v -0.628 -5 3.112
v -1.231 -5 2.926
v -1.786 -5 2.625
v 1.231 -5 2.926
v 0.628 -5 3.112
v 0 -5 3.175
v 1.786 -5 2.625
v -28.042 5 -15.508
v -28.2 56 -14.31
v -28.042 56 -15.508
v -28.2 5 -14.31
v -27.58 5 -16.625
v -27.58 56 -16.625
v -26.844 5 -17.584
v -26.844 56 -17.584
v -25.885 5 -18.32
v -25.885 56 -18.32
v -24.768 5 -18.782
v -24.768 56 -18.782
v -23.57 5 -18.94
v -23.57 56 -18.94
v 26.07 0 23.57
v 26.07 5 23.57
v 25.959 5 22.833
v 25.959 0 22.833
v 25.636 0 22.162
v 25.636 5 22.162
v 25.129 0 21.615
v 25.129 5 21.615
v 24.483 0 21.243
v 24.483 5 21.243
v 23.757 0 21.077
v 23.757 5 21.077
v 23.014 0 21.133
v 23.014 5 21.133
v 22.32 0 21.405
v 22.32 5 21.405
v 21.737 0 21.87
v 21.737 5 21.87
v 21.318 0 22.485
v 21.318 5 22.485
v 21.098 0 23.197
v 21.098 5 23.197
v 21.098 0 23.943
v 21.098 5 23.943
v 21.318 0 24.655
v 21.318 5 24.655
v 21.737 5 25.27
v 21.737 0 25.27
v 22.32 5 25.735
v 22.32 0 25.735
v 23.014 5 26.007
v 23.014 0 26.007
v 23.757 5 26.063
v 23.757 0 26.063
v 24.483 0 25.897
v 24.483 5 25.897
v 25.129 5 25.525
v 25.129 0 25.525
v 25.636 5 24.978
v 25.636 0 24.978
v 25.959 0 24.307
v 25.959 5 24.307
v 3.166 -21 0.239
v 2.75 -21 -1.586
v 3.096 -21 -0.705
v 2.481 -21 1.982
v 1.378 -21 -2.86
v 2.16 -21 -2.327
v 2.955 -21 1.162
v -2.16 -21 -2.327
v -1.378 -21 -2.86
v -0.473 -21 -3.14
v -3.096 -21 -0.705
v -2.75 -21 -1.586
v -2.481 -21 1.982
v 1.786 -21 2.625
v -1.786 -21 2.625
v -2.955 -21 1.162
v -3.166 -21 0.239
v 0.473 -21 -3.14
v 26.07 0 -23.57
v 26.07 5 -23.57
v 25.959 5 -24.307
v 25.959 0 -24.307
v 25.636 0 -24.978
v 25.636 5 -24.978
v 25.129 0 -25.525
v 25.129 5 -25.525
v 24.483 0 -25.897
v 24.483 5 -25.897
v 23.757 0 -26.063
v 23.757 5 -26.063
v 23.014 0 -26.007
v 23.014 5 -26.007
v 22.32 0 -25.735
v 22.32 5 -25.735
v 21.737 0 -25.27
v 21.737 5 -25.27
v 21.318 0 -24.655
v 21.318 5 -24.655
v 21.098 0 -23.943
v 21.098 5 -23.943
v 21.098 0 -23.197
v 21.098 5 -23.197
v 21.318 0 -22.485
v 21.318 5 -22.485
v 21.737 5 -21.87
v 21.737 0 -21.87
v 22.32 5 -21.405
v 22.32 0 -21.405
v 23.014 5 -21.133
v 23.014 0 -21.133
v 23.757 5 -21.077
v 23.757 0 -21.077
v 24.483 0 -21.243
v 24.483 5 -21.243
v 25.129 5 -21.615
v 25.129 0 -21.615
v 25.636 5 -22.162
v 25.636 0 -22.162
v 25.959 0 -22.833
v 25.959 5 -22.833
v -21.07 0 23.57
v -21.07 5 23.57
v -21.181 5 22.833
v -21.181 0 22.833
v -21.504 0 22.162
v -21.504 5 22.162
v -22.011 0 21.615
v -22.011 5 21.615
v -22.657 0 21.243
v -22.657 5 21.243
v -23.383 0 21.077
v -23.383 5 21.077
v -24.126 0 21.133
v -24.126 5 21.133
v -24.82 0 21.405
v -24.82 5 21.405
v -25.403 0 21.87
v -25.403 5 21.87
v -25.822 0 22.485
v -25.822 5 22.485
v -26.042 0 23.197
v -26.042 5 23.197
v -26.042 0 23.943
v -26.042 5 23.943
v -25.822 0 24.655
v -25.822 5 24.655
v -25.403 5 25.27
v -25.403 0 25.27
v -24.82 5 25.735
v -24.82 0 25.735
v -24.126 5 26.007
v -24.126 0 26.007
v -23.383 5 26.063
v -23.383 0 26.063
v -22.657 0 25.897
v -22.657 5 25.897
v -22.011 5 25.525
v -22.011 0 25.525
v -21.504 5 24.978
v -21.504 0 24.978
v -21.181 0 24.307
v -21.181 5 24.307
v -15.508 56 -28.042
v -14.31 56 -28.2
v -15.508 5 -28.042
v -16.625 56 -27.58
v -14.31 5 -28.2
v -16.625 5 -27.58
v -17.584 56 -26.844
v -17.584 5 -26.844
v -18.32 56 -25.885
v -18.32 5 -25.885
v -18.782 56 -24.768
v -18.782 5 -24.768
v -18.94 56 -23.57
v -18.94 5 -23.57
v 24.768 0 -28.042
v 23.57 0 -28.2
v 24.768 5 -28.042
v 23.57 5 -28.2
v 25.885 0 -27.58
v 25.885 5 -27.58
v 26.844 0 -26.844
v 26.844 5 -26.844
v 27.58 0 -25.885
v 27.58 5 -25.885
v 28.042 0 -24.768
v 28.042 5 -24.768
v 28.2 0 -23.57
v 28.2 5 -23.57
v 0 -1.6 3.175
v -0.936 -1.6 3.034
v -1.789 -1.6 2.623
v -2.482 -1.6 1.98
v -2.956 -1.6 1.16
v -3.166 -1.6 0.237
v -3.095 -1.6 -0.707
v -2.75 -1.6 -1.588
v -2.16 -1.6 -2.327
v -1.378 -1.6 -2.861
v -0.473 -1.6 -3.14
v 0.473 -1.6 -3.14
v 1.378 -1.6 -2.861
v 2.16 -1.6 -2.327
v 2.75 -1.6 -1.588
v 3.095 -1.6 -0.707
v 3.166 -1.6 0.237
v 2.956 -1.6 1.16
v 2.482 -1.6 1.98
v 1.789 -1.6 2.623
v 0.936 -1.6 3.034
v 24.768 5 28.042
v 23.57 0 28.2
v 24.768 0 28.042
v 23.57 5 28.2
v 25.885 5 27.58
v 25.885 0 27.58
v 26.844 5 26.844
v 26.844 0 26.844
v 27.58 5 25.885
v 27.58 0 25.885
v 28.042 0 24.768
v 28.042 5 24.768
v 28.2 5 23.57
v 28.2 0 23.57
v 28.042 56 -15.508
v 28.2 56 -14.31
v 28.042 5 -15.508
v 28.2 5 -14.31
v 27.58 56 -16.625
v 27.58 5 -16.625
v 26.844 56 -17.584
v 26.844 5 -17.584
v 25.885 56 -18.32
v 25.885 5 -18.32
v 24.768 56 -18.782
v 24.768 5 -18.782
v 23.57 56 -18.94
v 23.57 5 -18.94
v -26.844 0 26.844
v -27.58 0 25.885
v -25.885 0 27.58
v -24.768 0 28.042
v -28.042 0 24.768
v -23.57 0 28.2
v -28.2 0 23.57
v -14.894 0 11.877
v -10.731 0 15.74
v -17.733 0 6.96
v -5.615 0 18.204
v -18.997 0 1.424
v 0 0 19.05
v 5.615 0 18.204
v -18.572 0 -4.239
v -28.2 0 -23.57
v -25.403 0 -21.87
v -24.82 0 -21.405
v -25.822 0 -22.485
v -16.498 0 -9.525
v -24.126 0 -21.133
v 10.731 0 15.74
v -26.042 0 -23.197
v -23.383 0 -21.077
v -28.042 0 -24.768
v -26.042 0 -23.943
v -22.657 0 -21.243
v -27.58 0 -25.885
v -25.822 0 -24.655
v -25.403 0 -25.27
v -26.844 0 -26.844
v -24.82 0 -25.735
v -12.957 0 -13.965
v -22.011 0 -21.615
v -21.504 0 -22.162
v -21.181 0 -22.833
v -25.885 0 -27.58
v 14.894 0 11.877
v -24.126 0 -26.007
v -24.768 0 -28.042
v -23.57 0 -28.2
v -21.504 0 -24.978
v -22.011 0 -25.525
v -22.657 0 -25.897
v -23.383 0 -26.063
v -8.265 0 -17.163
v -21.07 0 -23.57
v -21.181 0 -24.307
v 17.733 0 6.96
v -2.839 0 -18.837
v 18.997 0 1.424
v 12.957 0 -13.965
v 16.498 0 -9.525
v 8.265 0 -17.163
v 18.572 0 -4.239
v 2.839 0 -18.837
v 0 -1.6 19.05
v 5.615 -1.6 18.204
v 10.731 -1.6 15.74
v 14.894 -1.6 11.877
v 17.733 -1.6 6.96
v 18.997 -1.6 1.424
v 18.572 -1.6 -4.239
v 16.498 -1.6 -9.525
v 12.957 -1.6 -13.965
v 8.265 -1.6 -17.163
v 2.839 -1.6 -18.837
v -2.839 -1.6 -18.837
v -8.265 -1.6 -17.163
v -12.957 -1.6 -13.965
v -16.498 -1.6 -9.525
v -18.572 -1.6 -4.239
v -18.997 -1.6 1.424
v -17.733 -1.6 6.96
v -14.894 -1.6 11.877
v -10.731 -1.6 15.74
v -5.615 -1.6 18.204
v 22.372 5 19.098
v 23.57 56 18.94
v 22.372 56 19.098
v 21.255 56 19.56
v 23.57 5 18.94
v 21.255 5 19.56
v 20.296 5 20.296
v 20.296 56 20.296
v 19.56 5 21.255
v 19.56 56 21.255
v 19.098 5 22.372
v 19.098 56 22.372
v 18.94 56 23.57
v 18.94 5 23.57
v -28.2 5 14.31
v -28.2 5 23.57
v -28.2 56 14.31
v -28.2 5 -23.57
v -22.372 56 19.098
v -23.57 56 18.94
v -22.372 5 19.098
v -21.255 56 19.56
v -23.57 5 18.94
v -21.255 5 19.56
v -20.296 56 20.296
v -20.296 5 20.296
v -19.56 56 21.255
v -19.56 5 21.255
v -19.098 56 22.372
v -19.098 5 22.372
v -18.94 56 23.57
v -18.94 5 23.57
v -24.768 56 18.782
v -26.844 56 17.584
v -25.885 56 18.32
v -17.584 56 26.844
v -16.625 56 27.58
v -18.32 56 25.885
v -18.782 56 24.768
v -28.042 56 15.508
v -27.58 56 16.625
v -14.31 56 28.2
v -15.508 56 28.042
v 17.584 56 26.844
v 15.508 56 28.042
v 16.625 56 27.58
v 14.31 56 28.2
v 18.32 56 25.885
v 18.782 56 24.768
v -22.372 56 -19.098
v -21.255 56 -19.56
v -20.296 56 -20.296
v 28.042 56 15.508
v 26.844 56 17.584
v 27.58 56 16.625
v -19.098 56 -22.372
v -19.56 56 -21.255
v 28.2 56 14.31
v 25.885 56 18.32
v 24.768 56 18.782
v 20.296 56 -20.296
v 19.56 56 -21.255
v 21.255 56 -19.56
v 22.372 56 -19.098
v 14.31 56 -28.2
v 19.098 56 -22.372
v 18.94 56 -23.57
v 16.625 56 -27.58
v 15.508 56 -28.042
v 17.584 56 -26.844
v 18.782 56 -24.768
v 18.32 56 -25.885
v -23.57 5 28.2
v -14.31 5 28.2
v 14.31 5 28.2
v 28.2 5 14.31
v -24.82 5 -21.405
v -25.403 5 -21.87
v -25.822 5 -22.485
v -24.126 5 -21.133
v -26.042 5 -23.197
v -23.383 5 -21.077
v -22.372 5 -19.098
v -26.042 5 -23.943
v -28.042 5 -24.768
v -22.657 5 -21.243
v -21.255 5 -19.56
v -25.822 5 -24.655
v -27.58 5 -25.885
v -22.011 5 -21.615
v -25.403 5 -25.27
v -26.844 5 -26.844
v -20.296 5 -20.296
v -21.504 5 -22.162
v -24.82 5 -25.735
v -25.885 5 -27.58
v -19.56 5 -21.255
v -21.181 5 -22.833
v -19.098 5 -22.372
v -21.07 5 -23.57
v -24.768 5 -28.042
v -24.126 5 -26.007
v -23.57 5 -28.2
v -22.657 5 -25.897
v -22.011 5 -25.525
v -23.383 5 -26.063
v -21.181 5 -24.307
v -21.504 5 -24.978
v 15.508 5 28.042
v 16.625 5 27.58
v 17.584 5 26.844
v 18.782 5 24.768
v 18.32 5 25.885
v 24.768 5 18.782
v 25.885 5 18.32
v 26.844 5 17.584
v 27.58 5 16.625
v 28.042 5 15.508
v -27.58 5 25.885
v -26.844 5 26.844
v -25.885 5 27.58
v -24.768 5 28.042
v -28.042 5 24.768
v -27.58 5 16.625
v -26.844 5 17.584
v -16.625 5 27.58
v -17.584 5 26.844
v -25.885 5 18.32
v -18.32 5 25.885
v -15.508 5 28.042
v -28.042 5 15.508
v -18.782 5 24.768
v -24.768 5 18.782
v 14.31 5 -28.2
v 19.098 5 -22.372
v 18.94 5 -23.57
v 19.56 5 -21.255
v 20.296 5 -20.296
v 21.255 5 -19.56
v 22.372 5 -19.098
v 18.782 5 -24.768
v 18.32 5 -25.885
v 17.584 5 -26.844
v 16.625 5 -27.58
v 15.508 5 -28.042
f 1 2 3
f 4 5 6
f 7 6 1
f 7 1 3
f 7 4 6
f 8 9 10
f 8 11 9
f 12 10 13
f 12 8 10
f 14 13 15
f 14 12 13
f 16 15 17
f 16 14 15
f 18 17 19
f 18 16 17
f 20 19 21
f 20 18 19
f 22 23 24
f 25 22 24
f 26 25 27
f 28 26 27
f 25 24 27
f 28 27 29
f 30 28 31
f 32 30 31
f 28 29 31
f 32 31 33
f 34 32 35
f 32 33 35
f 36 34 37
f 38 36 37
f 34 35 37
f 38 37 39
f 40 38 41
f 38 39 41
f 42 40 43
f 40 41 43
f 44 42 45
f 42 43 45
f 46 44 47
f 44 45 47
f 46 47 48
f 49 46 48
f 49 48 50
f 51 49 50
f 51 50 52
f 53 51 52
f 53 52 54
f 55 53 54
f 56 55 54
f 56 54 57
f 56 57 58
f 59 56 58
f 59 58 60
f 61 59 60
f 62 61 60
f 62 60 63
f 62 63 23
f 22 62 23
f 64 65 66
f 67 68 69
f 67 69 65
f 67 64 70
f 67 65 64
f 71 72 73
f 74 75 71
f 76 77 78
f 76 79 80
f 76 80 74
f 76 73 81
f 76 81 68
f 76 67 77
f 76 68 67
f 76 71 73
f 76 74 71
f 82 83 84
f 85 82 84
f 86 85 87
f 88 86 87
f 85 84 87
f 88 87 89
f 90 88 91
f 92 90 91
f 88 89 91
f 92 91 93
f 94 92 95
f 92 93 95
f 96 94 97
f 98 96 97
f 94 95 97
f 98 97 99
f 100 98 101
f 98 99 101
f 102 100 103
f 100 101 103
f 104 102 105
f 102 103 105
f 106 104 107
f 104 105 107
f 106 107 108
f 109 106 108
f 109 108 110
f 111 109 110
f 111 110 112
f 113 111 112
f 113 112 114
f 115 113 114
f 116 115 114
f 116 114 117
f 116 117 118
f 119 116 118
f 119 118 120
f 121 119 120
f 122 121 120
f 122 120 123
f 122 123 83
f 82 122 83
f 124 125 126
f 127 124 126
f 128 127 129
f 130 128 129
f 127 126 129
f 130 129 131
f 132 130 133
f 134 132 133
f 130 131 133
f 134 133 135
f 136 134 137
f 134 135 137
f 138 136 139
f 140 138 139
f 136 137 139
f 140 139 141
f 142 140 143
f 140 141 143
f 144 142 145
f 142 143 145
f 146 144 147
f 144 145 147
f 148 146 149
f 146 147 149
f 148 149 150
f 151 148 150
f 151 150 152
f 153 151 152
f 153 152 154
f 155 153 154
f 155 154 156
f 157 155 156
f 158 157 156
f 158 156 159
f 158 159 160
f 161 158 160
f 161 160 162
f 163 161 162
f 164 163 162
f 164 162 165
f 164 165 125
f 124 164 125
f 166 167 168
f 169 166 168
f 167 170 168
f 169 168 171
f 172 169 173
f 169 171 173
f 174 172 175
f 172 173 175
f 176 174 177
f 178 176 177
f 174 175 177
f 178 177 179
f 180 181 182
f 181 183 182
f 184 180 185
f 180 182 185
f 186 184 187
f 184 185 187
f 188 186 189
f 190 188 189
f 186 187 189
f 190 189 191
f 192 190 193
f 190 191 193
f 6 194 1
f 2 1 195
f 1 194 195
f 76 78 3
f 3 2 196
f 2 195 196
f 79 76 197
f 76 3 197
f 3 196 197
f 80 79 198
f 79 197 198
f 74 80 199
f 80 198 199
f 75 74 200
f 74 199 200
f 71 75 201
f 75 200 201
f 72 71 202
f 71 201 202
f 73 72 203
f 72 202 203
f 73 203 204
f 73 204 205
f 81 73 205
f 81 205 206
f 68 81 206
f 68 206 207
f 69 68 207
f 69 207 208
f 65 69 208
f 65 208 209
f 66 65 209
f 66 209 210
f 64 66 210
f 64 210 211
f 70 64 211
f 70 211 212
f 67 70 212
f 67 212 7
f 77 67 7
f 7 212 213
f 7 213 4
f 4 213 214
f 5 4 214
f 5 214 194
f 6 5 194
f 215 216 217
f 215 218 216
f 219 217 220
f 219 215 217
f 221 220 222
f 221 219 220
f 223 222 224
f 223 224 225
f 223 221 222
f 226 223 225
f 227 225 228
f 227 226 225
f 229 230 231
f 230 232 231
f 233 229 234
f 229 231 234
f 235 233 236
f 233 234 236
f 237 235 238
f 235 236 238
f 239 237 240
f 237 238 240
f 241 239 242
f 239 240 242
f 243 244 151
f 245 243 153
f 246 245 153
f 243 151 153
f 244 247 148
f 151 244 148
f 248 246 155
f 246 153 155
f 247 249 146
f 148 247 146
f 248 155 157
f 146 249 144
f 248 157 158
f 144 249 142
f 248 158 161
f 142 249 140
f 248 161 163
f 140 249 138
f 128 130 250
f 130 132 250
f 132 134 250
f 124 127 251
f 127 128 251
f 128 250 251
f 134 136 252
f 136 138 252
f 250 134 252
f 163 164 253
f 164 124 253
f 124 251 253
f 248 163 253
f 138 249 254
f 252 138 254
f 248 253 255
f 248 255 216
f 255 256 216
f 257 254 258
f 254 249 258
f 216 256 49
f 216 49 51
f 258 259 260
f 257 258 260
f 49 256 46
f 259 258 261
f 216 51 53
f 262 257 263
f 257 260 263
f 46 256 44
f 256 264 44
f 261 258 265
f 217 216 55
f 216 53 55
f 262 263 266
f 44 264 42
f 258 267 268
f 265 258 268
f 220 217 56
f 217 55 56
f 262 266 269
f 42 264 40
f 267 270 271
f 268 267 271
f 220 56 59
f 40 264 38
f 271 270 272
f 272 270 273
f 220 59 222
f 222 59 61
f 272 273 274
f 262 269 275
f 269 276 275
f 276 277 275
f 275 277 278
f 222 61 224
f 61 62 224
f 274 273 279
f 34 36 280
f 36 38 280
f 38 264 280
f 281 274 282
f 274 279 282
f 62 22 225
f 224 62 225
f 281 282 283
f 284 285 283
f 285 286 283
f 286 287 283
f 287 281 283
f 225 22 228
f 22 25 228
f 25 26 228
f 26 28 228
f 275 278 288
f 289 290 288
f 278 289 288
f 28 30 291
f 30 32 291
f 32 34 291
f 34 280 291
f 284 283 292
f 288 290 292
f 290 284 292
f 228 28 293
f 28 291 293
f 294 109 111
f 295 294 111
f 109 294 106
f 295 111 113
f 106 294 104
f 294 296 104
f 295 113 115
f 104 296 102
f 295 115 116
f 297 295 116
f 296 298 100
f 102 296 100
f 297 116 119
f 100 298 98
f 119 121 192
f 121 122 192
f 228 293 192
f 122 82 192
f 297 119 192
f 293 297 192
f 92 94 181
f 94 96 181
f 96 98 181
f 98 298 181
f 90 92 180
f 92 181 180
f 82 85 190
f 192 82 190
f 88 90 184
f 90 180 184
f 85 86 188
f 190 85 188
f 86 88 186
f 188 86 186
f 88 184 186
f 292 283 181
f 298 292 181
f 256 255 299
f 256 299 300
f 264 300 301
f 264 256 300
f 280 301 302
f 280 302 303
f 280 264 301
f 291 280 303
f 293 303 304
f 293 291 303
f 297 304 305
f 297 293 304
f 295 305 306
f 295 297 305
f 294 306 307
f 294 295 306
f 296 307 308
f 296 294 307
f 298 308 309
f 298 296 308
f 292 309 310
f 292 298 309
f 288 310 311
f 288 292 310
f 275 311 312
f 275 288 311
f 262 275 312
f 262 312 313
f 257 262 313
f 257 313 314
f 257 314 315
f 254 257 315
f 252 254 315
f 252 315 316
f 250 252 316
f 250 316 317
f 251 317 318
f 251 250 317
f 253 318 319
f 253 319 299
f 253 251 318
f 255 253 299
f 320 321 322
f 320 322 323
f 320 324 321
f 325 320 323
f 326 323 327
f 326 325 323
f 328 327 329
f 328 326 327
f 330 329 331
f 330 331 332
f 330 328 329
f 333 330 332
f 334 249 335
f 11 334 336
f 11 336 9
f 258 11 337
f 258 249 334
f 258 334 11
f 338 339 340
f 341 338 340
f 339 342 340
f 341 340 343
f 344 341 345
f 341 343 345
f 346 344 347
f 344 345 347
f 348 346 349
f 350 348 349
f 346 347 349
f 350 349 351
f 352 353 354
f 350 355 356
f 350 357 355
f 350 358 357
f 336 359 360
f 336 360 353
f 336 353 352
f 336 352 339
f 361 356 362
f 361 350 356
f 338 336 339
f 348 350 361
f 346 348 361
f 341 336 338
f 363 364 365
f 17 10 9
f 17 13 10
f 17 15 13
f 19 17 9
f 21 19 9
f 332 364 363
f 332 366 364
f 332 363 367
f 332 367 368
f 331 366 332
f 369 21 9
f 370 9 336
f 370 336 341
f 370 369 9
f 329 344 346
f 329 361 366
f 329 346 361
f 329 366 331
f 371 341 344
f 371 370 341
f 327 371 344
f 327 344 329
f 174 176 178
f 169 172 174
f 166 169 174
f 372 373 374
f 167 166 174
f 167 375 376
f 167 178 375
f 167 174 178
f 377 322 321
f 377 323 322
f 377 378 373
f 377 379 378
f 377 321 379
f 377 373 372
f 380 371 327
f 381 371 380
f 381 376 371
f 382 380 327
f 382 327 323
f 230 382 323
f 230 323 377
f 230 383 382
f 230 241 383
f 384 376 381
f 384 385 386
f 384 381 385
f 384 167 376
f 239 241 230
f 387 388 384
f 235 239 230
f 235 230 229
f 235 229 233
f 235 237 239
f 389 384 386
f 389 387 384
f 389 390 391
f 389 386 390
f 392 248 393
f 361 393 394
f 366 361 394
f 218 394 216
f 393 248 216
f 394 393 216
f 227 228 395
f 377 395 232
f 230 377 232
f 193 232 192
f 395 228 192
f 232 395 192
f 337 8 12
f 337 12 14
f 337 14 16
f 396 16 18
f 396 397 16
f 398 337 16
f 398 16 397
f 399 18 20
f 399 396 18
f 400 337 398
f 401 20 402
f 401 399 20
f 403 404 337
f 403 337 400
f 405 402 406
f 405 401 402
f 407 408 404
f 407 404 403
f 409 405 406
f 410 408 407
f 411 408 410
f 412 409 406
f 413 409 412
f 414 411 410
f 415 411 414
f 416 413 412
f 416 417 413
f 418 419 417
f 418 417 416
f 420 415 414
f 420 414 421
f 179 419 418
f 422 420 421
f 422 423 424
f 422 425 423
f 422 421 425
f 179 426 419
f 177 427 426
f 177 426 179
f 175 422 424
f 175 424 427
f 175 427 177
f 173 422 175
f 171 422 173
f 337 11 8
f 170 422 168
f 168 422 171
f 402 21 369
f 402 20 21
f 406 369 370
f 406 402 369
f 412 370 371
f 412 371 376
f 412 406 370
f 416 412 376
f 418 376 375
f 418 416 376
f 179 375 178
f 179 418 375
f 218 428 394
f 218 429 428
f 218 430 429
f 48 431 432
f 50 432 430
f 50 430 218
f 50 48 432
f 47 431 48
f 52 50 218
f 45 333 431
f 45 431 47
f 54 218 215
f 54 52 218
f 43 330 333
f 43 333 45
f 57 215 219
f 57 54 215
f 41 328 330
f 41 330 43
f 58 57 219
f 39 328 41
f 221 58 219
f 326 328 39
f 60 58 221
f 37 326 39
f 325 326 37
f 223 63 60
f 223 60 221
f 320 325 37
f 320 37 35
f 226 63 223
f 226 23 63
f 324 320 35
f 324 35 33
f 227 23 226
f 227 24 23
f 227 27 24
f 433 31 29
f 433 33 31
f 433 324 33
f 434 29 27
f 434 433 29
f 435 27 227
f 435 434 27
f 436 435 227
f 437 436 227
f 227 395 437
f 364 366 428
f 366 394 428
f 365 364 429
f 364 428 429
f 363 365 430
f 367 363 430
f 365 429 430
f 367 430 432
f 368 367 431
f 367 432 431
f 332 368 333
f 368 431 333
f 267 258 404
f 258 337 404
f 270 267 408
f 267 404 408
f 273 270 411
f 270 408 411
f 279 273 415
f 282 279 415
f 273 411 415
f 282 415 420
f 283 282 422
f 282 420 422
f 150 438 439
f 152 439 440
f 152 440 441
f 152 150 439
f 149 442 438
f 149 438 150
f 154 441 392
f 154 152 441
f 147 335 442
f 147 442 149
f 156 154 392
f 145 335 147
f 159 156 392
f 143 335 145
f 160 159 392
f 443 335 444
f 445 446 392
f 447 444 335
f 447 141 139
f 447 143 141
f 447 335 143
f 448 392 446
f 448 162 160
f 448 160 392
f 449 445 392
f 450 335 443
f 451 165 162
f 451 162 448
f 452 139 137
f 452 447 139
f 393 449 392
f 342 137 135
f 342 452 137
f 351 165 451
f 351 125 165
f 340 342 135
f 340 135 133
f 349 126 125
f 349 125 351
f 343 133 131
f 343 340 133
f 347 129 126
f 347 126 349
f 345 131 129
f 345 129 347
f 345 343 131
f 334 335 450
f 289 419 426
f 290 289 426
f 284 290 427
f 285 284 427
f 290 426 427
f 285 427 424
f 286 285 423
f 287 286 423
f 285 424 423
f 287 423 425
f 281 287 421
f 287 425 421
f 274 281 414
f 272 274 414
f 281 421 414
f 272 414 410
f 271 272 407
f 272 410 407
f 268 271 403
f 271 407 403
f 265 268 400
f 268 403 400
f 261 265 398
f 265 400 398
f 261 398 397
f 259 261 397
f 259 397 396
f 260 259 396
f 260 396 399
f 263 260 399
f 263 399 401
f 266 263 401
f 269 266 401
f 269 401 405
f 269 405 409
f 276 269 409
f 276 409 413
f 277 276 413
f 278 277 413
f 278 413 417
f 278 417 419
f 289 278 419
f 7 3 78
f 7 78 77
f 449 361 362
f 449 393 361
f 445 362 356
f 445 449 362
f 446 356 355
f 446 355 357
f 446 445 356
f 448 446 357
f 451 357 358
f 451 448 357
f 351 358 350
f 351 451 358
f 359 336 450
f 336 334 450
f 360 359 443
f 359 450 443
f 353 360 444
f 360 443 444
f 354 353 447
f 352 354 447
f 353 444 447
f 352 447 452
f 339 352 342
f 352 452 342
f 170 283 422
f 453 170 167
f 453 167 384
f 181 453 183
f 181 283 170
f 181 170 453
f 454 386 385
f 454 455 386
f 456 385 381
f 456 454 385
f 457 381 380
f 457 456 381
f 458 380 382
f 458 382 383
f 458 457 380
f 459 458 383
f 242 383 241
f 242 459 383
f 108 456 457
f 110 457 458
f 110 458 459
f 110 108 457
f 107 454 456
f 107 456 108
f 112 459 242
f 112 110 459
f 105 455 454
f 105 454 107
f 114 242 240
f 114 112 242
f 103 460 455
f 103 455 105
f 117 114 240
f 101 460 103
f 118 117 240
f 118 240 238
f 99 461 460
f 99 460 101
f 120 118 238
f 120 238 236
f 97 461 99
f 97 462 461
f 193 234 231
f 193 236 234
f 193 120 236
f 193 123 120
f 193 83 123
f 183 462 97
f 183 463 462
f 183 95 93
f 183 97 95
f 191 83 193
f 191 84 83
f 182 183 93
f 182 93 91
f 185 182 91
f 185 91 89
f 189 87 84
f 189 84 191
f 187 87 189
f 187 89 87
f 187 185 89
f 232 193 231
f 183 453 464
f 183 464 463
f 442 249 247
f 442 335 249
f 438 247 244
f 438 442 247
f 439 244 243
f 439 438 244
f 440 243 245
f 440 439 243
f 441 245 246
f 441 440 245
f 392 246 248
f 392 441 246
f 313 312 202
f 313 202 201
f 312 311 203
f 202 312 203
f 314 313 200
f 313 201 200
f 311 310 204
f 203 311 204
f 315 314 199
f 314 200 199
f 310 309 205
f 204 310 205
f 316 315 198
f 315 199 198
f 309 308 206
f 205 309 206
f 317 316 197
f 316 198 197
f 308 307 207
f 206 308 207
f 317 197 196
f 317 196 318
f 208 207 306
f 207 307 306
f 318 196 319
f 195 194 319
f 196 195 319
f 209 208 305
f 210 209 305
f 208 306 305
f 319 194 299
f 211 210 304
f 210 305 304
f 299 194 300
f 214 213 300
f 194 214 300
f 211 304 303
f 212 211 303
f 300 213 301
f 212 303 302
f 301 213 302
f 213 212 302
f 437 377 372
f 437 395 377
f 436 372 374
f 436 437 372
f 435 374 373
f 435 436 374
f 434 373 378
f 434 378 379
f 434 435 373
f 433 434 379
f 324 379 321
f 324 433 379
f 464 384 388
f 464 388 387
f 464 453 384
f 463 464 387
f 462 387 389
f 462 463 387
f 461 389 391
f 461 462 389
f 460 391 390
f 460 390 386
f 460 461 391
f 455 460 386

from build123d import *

# Parameters (mm, degrees)
SKETCH1_W                = 56.4
SKETCH1_H                = 56.4
BOSS_EXTRUDE1_DEPTH      = 56
SKETCH2_R                = 19.05
BOSS_EXTRUDE2_DEPTH      = 1.6
SKETCH3_R                = 3.175
BOSS_EXTRUDE3_DEPTH      = 19.4
CUT_EXTRUDE1_START       = -16
CUT_EXTRUDE1_DEPTH       = 16
F_5_0_5_DIAMETER_HOLE1_D = 5
SKETCH8_W                = 9.26
SKETCH8_H                = 9.26
CUT_EXTRUDE2_DEPTH       = 51
FILLET1_R                = 4.63


with BuildPart() as part:
    # Sketch1 → Boss-Extrude1 (new body)
    with BuildSketch(Plane(origin=(0, 0, 0), x_dir=(1, 0, 0), z_dir=(0, 1, 0))):
        Rectangle(SKETCH1_W, SKETCH1_H)
    extrude(amount=BOSS_EXTRUDE1_DEPTH)

    # Sketch2 → Boss-Extrude2 (add)
    with BuildSketch(Plane(origin=(0, 0, 0), x_dir=(1, 0, 0), z_dir=(0, 1, 0))):
        with Locations(Location((0, 0, 0), (0, 0, 270))):
            Circle(SKETCH2_R)
    extrude(amount=-BOSS_EXTRUDE2_DEPTH)

    # Sketch3 → Boss-Extrude3 (add)
    with BuildSketch(Plane.XZ.offset(1.6)):
        with Locations(Location((0, 0, 0), (0, 0, 90))):
            Circle(SKETCH3_R)
    extrude(amount=BOSS_EXTRUDE3_DEPTH)

    # Sketch4 → Cut-Extrude1 (cut)
    with BuildSketch(Plane.XZ.offset(21).offset(CUT_EXTRUDE1_START)):
        with BuildLine():
            Line((-1.78605711, 2.625), (1.78605711, 2.625))
            ThreePointArc((1.78605711, 2.625), (0, 3.175), (-1.78605711, 2.625))
        make_face()
    extrude(amount=CUT_EXTRUDE1_DEPTH, mode=Mode.SUBTRACT)

    # Ø5.0 (5) Diameter Hole1 (through all)
    with Locations(Plane(origin=(0, 0, 0), x_dir=(-1, 0, 0), z_dir=(0, -1, 0))):
        with Locations((-23.57, 23.569999995), (23.57, 23.57), (23.570000005, -23.57), (-23.569999995, -23.570000005)):
            Hole(F_5_0_5_DIAMETER_HOLE1_D / 2)

    # Sketch8 → Cut-Extrude2 (cut)
    with BuildSketch(Plane(origin=(0, 56, 0), x_dir=(1, 0, 0), z_dir=(0, 1, 0))):
        with Locations((-23.57, 23.57)):
            Rectangle(SKETCH8_W, SKETCH8_H)
        with Locations((23.57, 23.57)):
            Rectangle(SKETCH8_W, SKETCH8_H)
        with Locations((23.57, -23.57)):
            Rectangle(SKETCH8_W, SKETCH8_H)
        with Locations((-23.57, -23.57)):
            Rectangle(SKETCH8_W, SKETCH8_H)
    extrude(amount=-CUT_EXTRUDE2_DEPTH, mode=Mode.SUBTRACT)

    # Fillet1
    fillet1_edges = [part.edges().sort_by_distance(p)[0] for p in [
        (28.2, 2.5, 28.2),
        (28.2, 2.5, -28.2),
        (18.94, 30.5, -28.2),
        (28.2, 30.5, -18.94),
        (18.94, 30.5, -18.94),
        (18.94, 30.5, 18.94),
        (18.94, 30.5, 28.2),
        (28.2, 30.5, 18.94),
        (-18.94, 30.5, 18.94),
        (-18.94, 30.5, 28.2),
        (-28.2, 2.5, 28.2),
        (-28.2, 30.5, 18.94),
        (-18.94, 30.5, -28.2),
        (-28.2, 30.5, -18.94),
        (-28.2, 2.5, -28.2),
        (-18.94, 30.5, -18.94),
    ]]
    fillet(fillet1_edges, radius=FILLET1_R - 0.0001)  # a hair under: the kernel refuses the full size


solid = part.part
